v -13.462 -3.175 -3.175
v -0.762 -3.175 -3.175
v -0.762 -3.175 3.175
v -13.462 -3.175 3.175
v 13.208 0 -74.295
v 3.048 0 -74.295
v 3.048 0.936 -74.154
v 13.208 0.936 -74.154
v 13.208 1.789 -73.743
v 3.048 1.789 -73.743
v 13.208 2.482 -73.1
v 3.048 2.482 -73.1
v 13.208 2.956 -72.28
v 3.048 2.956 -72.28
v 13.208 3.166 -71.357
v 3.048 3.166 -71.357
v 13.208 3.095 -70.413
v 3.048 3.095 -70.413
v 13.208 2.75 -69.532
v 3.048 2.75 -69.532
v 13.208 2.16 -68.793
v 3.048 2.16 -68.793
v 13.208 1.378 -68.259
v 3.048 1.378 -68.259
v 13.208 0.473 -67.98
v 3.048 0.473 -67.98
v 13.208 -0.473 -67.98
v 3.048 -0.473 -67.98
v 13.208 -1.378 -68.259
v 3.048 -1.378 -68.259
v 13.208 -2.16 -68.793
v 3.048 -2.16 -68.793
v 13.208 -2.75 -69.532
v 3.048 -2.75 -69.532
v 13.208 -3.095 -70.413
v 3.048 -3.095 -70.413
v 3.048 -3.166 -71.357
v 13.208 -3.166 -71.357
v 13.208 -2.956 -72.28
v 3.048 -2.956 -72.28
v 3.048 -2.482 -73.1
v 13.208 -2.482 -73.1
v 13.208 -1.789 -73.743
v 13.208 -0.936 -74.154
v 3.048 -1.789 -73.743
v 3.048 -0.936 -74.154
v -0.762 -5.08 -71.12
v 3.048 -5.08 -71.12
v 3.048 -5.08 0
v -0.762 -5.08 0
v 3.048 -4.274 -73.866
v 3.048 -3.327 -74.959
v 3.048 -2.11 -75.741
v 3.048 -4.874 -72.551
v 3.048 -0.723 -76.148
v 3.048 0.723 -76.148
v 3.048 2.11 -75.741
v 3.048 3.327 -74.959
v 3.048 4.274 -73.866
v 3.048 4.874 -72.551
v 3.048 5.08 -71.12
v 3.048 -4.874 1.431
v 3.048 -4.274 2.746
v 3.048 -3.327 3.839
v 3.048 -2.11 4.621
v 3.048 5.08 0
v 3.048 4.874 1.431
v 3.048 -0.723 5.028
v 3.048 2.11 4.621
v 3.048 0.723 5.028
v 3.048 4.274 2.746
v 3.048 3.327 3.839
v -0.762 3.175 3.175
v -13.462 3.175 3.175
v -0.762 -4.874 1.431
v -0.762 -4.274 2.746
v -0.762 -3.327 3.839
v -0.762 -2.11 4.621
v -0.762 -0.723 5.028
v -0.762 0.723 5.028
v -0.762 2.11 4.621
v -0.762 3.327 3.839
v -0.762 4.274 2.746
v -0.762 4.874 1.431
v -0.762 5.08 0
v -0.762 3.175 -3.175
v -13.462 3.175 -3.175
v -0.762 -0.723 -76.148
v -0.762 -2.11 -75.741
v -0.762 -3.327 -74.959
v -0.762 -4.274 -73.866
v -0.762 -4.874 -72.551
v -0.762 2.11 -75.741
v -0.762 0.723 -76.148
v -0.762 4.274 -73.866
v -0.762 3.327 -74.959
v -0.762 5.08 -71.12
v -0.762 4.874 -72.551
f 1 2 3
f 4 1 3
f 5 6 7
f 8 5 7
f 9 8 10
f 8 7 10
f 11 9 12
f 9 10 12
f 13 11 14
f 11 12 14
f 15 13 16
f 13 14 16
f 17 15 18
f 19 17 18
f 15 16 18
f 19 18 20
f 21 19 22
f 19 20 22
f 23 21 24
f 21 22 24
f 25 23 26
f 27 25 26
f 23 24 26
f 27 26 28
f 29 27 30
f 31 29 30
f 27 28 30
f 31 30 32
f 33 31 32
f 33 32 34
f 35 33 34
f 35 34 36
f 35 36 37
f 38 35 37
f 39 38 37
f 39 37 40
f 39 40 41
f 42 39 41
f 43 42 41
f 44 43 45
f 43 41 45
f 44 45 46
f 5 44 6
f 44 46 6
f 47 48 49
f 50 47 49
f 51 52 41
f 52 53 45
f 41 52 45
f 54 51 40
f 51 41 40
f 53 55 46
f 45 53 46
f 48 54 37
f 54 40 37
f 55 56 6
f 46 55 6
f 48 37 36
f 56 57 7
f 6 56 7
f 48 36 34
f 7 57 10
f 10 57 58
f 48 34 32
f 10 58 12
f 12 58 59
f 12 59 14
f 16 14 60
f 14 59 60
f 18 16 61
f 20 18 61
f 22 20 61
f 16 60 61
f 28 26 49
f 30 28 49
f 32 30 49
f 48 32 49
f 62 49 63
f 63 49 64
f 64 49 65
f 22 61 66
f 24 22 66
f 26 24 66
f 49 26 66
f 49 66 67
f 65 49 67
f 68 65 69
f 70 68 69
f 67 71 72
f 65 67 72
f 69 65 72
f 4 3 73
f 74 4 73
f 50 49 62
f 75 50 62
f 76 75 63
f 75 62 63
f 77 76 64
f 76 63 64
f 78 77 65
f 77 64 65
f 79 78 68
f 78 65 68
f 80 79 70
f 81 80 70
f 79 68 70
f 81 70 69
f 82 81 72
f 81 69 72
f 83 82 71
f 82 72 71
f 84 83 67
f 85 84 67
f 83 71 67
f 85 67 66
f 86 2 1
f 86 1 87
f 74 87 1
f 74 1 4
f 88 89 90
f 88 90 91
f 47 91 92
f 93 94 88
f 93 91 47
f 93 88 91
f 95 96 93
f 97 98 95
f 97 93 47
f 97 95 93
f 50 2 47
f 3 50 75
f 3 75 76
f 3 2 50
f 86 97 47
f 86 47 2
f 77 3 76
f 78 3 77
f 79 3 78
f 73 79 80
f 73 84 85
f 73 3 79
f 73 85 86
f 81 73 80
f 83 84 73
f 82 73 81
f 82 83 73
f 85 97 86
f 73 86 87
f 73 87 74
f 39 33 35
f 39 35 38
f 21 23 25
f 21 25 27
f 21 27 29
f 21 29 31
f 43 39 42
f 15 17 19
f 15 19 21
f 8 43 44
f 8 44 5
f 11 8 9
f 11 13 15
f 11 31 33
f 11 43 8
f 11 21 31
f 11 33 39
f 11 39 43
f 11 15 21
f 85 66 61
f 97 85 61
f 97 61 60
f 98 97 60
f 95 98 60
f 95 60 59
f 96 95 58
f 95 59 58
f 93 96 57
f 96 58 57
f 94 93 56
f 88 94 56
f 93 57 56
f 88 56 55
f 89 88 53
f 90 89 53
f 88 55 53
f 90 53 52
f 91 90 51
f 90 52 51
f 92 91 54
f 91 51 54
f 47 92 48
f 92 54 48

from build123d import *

# Parameters (mm, degrees)
SKETCH1_R           = 3.81
BOSS_EXTRUDE1_DEPTH = 3.048
BOSS_EXTRUDE5_DEPTH = 3.81
SKETCH5_R           = 3.175
BOSS_EXTRUDE6_DEPTH = 10.16
SKETCH6_W           = 6.35
SKETCH6_H           = 6.35
BOSS_EXTRUDE7_DEPTH = 12.7


with BuildPart() as part:
    # Sketch1 → Boss-Extrude1 (new body)
    with BuildSketch(Plane(origin=(0, 0, 0), x_dir=(0, 0, -1), z_dir=(1, 0, 0))):
        Circle(SKETCH1_R)
    extrude(amount=BOSS_EXTRUDE1_DEPTH)

    # Sketch4 → Boss-Extrude5 (add)
    with BuildSketch(Plane(origin=(3.048, 0, 0), x_dir=(0, 0, -1), z_dir=(1, 0, 0))):
        with BuildLine():
            Line((0, 5.08), (71.12, 5.08))
            ThreePointArc((71.12, 5.08), (76.2, 0), (71.12, -5.08))
            Line((71.12, -5.08), (0, -5.08))
            ThreePointArc((0, -5.08), (-5.08, 0), (0, 5.08))
        make_face()
    extrude(amount=-BOSS_EXTRUDE5_DEPTH)

    # Sketch5 → Boss-Extrude6 (add)
    with BuildSketch(Plane(origin=(3.048, 0, 0), x_dir=(0, 0, -1), z_dir=(1, 0, 0))):
        with Locations((71.12, 0)):
            Circle(SKETCH5_R)
    extrude(amount=BOSS_EXTRUDE6_DEPTH)

    # Sketch6 → Boss-Extrude7 (add)
    with BuildSketch(Plane.ZY.offset(0.762)):
        Rectangle(SKETCH6_W, SKETCH6_H)
    extrude(amount=BOSS_EXTRUDE7_DEPTH)


solid = part.part
